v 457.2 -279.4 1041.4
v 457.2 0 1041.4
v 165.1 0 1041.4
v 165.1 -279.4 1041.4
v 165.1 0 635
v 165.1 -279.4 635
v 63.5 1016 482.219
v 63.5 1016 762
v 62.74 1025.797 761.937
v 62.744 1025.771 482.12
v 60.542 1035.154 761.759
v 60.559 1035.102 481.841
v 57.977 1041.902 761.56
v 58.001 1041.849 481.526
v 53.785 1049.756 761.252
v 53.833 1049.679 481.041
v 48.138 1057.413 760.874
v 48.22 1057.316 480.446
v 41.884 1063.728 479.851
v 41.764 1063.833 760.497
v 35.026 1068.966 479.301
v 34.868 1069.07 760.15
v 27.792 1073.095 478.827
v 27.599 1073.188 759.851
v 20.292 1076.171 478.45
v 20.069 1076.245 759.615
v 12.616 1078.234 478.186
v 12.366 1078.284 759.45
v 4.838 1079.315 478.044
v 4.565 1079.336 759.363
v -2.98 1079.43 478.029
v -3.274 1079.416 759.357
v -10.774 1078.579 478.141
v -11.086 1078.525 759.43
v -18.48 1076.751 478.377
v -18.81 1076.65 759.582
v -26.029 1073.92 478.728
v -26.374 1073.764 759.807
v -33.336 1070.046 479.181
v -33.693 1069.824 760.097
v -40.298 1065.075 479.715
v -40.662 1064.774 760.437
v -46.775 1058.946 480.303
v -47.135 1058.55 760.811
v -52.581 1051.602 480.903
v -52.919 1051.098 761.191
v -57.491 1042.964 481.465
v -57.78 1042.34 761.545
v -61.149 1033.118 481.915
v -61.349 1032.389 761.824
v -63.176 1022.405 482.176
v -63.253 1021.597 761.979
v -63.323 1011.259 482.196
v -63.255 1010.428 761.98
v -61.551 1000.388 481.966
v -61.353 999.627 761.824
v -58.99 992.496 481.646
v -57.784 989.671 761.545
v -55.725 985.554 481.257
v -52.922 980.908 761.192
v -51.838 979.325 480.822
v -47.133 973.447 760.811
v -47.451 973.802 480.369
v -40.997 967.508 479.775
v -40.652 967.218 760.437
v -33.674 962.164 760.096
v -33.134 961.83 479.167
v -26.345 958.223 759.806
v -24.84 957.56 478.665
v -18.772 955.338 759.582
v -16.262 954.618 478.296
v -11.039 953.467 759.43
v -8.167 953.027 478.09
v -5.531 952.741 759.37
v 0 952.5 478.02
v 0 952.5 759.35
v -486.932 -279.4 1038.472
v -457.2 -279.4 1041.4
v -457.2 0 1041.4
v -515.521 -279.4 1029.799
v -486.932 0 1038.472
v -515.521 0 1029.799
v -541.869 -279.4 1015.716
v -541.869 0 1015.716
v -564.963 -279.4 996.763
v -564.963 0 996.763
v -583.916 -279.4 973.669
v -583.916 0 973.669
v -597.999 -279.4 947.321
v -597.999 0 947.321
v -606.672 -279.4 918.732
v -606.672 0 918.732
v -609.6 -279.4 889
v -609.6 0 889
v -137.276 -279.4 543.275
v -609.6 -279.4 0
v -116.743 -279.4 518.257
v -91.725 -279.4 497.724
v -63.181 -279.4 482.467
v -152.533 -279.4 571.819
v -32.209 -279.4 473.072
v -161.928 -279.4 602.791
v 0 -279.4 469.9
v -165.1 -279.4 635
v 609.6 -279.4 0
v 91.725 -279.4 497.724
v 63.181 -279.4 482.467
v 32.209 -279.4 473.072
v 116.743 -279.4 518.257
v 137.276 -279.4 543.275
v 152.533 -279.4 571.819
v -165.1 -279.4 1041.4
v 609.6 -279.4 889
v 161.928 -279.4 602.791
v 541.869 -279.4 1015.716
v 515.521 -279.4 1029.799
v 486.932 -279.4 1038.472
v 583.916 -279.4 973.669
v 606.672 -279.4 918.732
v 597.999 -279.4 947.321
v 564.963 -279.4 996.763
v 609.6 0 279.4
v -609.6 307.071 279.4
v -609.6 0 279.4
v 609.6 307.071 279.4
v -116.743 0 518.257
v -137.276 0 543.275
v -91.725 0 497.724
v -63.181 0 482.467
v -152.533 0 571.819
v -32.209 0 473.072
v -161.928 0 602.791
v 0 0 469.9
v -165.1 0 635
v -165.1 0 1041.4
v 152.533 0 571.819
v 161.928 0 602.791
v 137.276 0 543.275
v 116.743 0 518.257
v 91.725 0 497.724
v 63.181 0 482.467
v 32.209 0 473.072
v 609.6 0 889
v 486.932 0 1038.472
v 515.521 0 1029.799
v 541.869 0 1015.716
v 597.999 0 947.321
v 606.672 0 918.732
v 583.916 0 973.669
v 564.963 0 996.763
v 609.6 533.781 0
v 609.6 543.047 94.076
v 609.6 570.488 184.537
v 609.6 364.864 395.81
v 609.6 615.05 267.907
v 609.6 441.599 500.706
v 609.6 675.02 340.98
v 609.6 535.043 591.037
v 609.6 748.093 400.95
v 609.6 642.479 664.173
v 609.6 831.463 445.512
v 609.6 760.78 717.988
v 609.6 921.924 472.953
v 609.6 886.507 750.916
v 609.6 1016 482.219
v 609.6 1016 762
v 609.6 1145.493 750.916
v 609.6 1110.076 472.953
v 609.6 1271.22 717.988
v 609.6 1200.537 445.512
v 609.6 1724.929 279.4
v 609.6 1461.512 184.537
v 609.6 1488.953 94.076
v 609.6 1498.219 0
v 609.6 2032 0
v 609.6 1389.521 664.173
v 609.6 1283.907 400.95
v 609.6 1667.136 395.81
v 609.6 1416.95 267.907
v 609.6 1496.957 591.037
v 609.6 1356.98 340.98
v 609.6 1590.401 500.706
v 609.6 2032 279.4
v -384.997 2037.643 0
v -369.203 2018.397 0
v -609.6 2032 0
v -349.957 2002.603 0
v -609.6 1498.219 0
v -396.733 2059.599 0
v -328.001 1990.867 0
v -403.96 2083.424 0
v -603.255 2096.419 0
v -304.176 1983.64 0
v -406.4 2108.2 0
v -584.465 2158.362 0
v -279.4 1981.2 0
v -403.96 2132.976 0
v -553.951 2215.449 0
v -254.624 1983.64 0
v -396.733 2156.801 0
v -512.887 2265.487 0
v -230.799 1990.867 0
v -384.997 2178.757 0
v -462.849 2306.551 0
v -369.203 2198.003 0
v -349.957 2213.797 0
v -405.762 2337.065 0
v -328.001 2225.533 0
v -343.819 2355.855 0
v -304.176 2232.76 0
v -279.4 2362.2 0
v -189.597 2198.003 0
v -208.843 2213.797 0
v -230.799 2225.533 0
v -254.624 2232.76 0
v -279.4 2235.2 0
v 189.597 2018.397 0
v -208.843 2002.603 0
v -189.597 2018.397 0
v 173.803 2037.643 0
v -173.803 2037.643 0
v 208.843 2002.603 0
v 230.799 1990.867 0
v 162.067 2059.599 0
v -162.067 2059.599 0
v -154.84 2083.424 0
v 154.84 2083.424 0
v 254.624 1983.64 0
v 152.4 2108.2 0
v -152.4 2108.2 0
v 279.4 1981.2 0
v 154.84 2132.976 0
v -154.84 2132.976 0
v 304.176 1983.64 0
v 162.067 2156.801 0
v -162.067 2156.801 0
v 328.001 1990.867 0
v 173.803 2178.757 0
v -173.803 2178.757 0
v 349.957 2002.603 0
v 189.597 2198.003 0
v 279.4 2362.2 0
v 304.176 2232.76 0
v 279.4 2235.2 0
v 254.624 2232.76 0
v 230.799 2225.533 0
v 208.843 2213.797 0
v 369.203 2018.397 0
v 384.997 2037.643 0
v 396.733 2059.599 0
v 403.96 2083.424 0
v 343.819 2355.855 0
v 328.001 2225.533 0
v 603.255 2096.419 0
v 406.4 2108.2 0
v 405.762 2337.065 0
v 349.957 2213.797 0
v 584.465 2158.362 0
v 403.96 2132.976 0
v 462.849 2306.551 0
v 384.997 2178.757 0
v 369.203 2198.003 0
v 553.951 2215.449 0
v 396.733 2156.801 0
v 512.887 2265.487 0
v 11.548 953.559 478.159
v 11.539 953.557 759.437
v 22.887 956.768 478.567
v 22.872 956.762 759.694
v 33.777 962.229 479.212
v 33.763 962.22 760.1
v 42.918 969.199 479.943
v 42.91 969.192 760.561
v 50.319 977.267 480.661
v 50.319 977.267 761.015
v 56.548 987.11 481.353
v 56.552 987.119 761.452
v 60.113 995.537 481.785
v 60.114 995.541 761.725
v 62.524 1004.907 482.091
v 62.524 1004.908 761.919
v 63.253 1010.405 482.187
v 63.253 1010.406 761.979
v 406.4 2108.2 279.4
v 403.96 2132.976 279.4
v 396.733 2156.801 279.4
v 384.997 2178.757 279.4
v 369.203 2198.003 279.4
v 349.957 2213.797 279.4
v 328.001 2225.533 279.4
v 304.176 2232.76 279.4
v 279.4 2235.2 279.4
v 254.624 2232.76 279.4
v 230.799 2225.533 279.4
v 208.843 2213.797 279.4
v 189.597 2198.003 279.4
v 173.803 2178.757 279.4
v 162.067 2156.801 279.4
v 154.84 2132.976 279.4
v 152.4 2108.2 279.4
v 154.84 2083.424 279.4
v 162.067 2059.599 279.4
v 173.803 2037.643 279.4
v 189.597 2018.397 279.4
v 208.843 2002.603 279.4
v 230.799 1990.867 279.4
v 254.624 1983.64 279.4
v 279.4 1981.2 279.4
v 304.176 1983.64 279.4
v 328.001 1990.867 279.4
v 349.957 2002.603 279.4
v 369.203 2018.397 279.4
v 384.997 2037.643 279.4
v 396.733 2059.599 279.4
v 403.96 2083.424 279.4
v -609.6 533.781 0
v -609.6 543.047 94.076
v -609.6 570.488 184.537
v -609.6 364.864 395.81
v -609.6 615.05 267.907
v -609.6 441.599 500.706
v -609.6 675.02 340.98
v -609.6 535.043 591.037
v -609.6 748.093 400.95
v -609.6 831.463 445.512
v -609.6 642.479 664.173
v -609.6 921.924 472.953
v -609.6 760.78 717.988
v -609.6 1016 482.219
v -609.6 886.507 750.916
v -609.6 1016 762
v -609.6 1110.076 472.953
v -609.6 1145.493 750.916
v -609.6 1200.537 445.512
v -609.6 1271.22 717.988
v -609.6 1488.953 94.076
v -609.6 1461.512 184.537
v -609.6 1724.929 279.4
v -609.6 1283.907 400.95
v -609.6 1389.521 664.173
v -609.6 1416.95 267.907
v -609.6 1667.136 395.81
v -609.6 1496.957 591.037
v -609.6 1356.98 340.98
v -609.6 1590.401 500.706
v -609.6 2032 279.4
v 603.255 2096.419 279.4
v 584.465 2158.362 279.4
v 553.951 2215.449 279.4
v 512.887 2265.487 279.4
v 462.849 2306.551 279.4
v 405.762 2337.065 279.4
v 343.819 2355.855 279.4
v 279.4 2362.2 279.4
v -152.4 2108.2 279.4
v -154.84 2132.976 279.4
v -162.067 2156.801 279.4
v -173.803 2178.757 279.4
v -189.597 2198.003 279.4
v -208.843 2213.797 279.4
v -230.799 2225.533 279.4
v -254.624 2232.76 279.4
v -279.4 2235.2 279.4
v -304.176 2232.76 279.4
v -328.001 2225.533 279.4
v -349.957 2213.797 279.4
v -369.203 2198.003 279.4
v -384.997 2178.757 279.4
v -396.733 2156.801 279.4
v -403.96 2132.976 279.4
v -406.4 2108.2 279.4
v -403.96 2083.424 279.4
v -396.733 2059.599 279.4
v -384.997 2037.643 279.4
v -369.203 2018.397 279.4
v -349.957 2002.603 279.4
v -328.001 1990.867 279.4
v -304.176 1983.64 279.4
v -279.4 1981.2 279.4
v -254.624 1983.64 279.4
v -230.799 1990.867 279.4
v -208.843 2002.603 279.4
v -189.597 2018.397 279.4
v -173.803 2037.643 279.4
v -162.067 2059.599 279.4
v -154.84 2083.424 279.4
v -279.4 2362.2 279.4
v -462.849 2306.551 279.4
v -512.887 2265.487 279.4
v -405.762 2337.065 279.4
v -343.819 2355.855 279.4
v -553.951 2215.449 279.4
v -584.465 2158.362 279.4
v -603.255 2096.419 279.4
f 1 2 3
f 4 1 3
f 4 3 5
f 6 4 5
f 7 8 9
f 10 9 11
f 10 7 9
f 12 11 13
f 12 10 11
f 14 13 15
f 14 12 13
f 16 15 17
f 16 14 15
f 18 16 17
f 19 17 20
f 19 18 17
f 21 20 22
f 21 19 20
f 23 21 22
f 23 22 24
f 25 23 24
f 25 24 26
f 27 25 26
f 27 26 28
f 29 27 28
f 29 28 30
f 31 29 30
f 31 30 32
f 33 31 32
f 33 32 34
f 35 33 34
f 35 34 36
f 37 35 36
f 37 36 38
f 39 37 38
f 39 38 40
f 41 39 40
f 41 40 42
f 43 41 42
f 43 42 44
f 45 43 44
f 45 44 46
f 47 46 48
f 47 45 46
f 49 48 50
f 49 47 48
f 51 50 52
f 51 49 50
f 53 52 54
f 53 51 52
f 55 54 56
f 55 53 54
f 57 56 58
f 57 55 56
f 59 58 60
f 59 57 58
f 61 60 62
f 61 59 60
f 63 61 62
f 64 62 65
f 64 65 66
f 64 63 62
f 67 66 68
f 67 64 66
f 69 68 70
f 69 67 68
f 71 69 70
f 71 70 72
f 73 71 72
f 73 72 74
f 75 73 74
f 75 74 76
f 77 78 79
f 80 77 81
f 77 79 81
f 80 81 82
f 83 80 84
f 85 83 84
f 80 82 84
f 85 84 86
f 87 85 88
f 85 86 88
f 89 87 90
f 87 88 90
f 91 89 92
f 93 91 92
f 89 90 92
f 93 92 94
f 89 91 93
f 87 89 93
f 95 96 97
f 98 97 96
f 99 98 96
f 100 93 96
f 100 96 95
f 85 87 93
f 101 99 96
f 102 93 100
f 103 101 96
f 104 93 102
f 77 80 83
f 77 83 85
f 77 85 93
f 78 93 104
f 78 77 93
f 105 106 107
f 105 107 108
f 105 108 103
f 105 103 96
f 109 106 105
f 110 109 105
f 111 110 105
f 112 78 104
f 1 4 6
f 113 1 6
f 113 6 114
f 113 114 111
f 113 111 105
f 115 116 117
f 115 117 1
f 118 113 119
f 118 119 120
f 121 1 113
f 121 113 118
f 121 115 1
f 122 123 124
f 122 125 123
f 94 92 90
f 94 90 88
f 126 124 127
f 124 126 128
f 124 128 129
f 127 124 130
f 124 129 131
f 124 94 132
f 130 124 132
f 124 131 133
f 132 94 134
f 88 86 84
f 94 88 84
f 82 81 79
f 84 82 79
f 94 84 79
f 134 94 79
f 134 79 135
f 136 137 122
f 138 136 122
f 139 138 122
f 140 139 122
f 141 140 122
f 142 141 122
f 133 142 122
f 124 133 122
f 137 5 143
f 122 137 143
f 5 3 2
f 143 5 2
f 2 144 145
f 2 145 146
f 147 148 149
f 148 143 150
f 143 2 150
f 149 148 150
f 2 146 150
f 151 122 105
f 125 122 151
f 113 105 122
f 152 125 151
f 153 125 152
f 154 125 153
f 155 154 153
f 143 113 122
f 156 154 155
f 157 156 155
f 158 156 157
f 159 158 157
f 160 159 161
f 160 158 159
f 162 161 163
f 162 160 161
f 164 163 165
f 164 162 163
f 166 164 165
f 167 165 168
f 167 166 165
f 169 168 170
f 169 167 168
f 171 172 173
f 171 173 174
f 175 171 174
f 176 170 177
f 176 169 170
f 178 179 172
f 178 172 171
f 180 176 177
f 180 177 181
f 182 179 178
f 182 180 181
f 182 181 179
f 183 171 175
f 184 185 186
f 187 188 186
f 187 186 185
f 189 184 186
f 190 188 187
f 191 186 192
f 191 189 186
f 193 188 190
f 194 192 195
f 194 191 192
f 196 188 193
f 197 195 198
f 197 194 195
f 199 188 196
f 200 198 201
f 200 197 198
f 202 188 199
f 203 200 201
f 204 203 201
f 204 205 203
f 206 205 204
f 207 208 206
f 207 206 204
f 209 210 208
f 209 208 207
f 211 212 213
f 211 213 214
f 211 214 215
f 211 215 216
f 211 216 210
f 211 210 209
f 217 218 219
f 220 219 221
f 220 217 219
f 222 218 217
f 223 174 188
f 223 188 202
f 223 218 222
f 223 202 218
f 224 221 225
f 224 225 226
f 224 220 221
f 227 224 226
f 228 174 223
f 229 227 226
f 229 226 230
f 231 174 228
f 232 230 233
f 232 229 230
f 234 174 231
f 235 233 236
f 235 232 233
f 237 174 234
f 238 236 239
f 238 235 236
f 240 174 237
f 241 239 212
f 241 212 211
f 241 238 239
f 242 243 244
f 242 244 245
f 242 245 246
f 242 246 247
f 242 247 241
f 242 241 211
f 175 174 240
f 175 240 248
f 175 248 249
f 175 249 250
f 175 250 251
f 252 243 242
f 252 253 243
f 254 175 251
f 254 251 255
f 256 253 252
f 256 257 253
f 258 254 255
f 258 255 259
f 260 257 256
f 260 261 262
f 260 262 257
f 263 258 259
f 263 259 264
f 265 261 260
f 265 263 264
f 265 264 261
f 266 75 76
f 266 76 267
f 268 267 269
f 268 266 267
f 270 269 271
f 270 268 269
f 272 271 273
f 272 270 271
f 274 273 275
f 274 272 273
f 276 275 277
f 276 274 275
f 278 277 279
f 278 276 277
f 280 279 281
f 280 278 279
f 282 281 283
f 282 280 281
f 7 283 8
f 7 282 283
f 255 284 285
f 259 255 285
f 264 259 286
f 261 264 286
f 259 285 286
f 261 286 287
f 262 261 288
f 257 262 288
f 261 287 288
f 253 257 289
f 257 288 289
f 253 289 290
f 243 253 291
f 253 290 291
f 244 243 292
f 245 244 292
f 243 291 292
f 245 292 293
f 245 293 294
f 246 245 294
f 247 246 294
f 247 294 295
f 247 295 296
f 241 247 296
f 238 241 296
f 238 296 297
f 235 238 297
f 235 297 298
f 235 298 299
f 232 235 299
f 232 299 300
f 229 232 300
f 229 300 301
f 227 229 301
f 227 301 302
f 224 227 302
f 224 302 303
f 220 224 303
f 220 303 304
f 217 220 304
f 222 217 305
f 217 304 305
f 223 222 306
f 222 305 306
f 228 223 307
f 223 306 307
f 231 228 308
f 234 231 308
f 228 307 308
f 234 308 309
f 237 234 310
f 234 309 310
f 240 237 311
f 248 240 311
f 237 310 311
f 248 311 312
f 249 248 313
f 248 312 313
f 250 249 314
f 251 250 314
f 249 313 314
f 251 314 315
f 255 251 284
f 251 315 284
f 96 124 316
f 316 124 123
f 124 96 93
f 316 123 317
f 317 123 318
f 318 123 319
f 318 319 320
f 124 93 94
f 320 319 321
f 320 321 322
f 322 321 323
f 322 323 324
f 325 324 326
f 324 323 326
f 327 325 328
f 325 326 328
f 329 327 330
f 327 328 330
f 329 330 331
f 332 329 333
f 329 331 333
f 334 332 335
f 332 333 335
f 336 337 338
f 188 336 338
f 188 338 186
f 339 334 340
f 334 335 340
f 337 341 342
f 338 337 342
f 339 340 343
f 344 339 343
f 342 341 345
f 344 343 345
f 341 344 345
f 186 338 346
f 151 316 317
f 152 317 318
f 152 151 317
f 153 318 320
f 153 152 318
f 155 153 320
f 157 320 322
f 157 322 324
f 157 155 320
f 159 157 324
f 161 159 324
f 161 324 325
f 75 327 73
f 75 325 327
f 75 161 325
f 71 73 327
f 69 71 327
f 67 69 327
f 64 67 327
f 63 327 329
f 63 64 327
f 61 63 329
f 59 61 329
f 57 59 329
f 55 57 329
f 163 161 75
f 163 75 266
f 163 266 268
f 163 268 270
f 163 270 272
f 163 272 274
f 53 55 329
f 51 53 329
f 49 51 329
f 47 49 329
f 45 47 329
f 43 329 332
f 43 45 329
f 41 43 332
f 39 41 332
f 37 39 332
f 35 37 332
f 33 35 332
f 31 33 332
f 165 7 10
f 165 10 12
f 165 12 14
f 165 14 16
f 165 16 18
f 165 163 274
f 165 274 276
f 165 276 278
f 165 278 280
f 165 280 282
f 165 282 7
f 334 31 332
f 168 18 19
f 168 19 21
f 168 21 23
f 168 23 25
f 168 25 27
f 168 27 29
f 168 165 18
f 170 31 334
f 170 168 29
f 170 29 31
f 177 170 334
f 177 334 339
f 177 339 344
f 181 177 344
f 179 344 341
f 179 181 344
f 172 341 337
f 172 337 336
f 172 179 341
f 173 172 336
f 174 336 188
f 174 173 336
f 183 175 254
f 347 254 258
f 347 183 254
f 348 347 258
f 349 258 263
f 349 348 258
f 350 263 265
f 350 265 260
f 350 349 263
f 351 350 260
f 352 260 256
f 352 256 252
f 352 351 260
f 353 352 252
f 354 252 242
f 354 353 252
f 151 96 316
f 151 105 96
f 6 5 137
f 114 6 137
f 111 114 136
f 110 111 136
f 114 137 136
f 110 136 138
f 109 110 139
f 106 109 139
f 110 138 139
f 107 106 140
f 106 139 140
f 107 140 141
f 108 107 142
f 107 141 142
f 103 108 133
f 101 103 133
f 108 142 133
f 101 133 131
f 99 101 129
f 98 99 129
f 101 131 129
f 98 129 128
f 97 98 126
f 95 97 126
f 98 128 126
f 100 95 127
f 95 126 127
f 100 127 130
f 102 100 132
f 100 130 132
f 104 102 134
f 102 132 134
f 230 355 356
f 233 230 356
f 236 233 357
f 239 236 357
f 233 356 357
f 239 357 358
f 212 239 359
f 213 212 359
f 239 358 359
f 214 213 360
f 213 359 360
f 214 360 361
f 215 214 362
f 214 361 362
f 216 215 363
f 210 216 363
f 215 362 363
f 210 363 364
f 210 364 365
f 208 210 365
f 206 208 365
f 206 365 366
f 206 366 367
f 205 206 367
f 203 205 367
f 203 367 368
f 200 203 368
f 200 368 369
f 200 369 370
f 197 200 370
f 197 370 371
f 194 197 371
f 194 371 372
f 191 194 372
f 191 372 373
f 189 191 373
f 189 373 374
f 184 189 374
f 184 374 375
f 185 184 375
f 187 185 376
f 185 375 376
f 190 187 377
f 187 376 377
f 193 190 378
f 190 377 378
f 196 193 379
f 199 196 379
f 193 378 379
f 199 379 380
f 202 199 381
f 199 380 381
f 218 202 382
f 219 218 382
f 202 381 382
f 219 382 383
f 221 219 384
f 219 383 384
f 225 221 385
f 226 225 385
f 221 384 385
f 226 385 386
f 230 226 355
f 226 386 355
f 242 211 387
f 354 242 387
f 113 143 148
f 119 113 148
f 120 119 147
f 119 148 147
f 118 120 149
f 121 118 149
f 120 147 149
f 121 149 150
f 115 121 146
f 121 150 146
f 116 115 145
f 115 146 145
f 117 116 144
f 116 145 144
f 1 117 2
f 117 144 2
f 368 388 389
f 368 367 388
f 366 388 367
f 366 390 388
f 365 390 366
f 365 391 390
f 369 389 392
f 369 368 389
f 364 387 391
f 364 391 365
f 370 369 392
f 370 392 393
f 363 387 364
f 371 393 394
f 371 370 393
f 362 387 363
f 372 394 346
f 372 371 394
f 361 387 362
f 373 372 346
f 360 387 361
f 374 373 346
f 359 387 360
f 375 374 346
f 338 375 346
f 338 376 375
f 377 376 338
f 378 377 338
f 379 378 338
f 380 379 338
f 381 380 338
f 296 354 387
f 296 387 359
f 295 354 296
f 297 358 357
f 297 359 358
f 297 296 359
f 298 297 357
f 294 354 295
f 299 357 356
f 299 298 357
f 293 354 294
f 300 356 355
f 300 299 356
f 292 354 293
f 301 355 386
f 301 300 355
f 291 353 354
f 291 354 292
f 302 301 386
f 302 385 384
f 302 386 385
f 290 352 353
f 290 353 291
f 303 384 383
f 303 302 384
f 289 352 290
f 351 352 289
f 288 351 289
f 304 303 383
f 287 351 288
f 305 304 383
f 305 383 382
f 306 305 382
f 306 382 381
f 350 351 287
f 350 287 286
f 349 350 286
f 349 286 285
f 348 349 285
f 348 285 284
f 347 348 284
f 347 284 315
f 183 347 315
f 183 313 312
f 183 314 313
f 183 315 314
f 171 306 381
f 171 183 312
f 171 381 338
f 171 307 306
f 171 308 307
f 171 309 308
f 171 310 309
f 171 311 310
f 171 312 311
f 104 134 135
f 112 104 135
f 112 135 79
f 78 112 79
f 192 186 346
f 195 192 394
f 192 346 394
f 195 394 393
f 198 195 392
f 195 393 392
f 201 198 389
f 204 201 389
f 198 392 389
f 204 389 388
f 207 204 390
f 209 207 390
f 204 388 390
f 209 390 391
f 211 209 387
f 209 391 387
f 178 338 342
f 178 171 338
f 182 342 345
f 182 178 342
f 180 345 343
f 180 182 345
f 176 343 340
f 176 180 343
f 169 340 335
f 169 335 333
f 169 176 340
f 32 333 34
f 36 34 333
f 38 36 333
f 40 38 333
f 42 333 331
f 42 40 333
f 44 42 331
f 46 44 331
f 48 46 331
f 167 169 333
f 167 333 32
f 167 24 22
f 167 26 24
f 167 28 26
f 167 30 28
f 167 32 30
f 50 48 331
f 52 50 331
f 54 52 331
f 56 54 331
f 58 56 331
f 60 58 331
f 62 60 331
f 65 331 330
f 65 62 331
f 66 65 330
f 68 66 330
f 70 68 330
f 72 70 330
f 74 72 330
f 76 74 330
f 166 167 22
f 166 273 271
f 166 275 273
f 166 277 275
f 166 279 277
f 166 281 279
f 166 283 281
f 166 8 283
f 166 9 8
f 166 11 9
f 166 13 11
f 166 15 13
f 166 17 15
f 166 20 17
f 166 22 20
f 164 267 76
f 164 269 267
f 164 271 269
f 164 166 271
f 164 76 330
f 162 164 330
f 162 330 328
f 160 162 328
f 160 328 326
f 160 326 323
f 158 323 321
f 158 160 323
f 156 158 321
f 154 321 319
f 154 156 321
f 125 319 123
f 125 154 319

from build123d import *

# Parameters (mm, degrees)
F1_DEPTH = 279.4
F3_DEPTH = 609.6
F4_R     = 127
F5_DEPTH = 279.401
F6_DEPTH = 762.001
F7_R     = 330.2


with BuildPart() as f1:
    # F0 (on Front) → F1 (new body)
    with BuildSketch(Plane.XZ):
        with BuildLine():
            Line((-609.6, 0), (0, 0))
            Line((0, 0), (609.6, 0))
            Line((609.6, 0), (609.6, 889))
            ThreePointArc((609.6, 889), (564.963073, 996.763073), (457.2, 1041.4))
            Line((457.2, 1041.4), (165.1, 1041.4))
            Line((165.1, 1041.4), (165.1, 635))
            ThreePointArc((165.1, 635), (0, 469.9), (-165.1, 635))
            Line((-165.1, 635), (-165.1, 1041.4))
            Line((-165.1, 1041.4), (-457.2, 1041.4))
            ThreePointArc((-457.2, 1041.4), (-564.963073, 996.763073), (-609.6, 889))
            Line((-609.6, 889), (-609.6, 0))
        make_face()
    extrude(amount=F1_DEPTH)

    # F2 (on Right) → F3 (join, symmetric)
    with BuildSketch(Plane.YZ):
        with BuildLine():
            Line((0, 279.4), (0, 0))
            Line((0, 0), (533.781, 0))
            ThreePointArc((533.781, 0), (1016, 482.219), (1498.219, 0))
            Line((1498.219, 0), (2362.2, 0))
            Line((2362.2, 0), (2362.2, 279.4))
            Line((2362.2, 279.4), (1724.928515, 279.4))
            ThreePointArc((1724.928515, 279.4), (1016, 762), (307.071485, 279.4))
            Line((307.071485, 279.4), (0, 279.4))
        make_face()
    extrude(amount=F3_DEPTH, both=True)

    # F4 (on face) → F5 (cut, through all)
    with BuildSketch(Plane.XY.offset(279.4)):
        with Locations((279.4, 2108.2)):
            Circle(F4_R)
        with Locations((-279.4, 2108.2)):
            Circle(F4_R)
        with BuildLine():
            ThreePointArc((0, 952.5), (44.901281, 971.098719), (63.5, 1016))
            ThreePointArc((63.5, 1016), (-44.901281, 1060.901281), (0, 952.5))
        make_face()
    extrude(amount=-F5_DEPTH, mode=Mode.SUBTRACT)

    # F4 (on face) → F6 (cut, through all)
    with BuildSketch(Plane.XY.offset(279.4)):
        with Locations((279.4, 2108.2)):
            Circle(F4_R)
        with Locations((-279.4, 2108.2)):
            Circle(F4_R)
        with BuildLine():
            ThreePointArc((0, 952.5), (44.901281, 971.098719), (63.5, 1016))
            ThreePointArc((63.5, 1016), (-44.901281, 1060.901281), (0, 952.5))
        make_face()
    extrude(amount=F6_DEPTH, mode=Mode.SUBTRACT)

    # F7
    f7_edges = [f1.edges().sort_by_distance(p)[0] for p in [
        (-609.6, 2362.2, 139.7),
        (609.6, 2362.2, 139.7),
    ]]
    fillet(f7_edges, radius=F7_R)


solid = f1.part
